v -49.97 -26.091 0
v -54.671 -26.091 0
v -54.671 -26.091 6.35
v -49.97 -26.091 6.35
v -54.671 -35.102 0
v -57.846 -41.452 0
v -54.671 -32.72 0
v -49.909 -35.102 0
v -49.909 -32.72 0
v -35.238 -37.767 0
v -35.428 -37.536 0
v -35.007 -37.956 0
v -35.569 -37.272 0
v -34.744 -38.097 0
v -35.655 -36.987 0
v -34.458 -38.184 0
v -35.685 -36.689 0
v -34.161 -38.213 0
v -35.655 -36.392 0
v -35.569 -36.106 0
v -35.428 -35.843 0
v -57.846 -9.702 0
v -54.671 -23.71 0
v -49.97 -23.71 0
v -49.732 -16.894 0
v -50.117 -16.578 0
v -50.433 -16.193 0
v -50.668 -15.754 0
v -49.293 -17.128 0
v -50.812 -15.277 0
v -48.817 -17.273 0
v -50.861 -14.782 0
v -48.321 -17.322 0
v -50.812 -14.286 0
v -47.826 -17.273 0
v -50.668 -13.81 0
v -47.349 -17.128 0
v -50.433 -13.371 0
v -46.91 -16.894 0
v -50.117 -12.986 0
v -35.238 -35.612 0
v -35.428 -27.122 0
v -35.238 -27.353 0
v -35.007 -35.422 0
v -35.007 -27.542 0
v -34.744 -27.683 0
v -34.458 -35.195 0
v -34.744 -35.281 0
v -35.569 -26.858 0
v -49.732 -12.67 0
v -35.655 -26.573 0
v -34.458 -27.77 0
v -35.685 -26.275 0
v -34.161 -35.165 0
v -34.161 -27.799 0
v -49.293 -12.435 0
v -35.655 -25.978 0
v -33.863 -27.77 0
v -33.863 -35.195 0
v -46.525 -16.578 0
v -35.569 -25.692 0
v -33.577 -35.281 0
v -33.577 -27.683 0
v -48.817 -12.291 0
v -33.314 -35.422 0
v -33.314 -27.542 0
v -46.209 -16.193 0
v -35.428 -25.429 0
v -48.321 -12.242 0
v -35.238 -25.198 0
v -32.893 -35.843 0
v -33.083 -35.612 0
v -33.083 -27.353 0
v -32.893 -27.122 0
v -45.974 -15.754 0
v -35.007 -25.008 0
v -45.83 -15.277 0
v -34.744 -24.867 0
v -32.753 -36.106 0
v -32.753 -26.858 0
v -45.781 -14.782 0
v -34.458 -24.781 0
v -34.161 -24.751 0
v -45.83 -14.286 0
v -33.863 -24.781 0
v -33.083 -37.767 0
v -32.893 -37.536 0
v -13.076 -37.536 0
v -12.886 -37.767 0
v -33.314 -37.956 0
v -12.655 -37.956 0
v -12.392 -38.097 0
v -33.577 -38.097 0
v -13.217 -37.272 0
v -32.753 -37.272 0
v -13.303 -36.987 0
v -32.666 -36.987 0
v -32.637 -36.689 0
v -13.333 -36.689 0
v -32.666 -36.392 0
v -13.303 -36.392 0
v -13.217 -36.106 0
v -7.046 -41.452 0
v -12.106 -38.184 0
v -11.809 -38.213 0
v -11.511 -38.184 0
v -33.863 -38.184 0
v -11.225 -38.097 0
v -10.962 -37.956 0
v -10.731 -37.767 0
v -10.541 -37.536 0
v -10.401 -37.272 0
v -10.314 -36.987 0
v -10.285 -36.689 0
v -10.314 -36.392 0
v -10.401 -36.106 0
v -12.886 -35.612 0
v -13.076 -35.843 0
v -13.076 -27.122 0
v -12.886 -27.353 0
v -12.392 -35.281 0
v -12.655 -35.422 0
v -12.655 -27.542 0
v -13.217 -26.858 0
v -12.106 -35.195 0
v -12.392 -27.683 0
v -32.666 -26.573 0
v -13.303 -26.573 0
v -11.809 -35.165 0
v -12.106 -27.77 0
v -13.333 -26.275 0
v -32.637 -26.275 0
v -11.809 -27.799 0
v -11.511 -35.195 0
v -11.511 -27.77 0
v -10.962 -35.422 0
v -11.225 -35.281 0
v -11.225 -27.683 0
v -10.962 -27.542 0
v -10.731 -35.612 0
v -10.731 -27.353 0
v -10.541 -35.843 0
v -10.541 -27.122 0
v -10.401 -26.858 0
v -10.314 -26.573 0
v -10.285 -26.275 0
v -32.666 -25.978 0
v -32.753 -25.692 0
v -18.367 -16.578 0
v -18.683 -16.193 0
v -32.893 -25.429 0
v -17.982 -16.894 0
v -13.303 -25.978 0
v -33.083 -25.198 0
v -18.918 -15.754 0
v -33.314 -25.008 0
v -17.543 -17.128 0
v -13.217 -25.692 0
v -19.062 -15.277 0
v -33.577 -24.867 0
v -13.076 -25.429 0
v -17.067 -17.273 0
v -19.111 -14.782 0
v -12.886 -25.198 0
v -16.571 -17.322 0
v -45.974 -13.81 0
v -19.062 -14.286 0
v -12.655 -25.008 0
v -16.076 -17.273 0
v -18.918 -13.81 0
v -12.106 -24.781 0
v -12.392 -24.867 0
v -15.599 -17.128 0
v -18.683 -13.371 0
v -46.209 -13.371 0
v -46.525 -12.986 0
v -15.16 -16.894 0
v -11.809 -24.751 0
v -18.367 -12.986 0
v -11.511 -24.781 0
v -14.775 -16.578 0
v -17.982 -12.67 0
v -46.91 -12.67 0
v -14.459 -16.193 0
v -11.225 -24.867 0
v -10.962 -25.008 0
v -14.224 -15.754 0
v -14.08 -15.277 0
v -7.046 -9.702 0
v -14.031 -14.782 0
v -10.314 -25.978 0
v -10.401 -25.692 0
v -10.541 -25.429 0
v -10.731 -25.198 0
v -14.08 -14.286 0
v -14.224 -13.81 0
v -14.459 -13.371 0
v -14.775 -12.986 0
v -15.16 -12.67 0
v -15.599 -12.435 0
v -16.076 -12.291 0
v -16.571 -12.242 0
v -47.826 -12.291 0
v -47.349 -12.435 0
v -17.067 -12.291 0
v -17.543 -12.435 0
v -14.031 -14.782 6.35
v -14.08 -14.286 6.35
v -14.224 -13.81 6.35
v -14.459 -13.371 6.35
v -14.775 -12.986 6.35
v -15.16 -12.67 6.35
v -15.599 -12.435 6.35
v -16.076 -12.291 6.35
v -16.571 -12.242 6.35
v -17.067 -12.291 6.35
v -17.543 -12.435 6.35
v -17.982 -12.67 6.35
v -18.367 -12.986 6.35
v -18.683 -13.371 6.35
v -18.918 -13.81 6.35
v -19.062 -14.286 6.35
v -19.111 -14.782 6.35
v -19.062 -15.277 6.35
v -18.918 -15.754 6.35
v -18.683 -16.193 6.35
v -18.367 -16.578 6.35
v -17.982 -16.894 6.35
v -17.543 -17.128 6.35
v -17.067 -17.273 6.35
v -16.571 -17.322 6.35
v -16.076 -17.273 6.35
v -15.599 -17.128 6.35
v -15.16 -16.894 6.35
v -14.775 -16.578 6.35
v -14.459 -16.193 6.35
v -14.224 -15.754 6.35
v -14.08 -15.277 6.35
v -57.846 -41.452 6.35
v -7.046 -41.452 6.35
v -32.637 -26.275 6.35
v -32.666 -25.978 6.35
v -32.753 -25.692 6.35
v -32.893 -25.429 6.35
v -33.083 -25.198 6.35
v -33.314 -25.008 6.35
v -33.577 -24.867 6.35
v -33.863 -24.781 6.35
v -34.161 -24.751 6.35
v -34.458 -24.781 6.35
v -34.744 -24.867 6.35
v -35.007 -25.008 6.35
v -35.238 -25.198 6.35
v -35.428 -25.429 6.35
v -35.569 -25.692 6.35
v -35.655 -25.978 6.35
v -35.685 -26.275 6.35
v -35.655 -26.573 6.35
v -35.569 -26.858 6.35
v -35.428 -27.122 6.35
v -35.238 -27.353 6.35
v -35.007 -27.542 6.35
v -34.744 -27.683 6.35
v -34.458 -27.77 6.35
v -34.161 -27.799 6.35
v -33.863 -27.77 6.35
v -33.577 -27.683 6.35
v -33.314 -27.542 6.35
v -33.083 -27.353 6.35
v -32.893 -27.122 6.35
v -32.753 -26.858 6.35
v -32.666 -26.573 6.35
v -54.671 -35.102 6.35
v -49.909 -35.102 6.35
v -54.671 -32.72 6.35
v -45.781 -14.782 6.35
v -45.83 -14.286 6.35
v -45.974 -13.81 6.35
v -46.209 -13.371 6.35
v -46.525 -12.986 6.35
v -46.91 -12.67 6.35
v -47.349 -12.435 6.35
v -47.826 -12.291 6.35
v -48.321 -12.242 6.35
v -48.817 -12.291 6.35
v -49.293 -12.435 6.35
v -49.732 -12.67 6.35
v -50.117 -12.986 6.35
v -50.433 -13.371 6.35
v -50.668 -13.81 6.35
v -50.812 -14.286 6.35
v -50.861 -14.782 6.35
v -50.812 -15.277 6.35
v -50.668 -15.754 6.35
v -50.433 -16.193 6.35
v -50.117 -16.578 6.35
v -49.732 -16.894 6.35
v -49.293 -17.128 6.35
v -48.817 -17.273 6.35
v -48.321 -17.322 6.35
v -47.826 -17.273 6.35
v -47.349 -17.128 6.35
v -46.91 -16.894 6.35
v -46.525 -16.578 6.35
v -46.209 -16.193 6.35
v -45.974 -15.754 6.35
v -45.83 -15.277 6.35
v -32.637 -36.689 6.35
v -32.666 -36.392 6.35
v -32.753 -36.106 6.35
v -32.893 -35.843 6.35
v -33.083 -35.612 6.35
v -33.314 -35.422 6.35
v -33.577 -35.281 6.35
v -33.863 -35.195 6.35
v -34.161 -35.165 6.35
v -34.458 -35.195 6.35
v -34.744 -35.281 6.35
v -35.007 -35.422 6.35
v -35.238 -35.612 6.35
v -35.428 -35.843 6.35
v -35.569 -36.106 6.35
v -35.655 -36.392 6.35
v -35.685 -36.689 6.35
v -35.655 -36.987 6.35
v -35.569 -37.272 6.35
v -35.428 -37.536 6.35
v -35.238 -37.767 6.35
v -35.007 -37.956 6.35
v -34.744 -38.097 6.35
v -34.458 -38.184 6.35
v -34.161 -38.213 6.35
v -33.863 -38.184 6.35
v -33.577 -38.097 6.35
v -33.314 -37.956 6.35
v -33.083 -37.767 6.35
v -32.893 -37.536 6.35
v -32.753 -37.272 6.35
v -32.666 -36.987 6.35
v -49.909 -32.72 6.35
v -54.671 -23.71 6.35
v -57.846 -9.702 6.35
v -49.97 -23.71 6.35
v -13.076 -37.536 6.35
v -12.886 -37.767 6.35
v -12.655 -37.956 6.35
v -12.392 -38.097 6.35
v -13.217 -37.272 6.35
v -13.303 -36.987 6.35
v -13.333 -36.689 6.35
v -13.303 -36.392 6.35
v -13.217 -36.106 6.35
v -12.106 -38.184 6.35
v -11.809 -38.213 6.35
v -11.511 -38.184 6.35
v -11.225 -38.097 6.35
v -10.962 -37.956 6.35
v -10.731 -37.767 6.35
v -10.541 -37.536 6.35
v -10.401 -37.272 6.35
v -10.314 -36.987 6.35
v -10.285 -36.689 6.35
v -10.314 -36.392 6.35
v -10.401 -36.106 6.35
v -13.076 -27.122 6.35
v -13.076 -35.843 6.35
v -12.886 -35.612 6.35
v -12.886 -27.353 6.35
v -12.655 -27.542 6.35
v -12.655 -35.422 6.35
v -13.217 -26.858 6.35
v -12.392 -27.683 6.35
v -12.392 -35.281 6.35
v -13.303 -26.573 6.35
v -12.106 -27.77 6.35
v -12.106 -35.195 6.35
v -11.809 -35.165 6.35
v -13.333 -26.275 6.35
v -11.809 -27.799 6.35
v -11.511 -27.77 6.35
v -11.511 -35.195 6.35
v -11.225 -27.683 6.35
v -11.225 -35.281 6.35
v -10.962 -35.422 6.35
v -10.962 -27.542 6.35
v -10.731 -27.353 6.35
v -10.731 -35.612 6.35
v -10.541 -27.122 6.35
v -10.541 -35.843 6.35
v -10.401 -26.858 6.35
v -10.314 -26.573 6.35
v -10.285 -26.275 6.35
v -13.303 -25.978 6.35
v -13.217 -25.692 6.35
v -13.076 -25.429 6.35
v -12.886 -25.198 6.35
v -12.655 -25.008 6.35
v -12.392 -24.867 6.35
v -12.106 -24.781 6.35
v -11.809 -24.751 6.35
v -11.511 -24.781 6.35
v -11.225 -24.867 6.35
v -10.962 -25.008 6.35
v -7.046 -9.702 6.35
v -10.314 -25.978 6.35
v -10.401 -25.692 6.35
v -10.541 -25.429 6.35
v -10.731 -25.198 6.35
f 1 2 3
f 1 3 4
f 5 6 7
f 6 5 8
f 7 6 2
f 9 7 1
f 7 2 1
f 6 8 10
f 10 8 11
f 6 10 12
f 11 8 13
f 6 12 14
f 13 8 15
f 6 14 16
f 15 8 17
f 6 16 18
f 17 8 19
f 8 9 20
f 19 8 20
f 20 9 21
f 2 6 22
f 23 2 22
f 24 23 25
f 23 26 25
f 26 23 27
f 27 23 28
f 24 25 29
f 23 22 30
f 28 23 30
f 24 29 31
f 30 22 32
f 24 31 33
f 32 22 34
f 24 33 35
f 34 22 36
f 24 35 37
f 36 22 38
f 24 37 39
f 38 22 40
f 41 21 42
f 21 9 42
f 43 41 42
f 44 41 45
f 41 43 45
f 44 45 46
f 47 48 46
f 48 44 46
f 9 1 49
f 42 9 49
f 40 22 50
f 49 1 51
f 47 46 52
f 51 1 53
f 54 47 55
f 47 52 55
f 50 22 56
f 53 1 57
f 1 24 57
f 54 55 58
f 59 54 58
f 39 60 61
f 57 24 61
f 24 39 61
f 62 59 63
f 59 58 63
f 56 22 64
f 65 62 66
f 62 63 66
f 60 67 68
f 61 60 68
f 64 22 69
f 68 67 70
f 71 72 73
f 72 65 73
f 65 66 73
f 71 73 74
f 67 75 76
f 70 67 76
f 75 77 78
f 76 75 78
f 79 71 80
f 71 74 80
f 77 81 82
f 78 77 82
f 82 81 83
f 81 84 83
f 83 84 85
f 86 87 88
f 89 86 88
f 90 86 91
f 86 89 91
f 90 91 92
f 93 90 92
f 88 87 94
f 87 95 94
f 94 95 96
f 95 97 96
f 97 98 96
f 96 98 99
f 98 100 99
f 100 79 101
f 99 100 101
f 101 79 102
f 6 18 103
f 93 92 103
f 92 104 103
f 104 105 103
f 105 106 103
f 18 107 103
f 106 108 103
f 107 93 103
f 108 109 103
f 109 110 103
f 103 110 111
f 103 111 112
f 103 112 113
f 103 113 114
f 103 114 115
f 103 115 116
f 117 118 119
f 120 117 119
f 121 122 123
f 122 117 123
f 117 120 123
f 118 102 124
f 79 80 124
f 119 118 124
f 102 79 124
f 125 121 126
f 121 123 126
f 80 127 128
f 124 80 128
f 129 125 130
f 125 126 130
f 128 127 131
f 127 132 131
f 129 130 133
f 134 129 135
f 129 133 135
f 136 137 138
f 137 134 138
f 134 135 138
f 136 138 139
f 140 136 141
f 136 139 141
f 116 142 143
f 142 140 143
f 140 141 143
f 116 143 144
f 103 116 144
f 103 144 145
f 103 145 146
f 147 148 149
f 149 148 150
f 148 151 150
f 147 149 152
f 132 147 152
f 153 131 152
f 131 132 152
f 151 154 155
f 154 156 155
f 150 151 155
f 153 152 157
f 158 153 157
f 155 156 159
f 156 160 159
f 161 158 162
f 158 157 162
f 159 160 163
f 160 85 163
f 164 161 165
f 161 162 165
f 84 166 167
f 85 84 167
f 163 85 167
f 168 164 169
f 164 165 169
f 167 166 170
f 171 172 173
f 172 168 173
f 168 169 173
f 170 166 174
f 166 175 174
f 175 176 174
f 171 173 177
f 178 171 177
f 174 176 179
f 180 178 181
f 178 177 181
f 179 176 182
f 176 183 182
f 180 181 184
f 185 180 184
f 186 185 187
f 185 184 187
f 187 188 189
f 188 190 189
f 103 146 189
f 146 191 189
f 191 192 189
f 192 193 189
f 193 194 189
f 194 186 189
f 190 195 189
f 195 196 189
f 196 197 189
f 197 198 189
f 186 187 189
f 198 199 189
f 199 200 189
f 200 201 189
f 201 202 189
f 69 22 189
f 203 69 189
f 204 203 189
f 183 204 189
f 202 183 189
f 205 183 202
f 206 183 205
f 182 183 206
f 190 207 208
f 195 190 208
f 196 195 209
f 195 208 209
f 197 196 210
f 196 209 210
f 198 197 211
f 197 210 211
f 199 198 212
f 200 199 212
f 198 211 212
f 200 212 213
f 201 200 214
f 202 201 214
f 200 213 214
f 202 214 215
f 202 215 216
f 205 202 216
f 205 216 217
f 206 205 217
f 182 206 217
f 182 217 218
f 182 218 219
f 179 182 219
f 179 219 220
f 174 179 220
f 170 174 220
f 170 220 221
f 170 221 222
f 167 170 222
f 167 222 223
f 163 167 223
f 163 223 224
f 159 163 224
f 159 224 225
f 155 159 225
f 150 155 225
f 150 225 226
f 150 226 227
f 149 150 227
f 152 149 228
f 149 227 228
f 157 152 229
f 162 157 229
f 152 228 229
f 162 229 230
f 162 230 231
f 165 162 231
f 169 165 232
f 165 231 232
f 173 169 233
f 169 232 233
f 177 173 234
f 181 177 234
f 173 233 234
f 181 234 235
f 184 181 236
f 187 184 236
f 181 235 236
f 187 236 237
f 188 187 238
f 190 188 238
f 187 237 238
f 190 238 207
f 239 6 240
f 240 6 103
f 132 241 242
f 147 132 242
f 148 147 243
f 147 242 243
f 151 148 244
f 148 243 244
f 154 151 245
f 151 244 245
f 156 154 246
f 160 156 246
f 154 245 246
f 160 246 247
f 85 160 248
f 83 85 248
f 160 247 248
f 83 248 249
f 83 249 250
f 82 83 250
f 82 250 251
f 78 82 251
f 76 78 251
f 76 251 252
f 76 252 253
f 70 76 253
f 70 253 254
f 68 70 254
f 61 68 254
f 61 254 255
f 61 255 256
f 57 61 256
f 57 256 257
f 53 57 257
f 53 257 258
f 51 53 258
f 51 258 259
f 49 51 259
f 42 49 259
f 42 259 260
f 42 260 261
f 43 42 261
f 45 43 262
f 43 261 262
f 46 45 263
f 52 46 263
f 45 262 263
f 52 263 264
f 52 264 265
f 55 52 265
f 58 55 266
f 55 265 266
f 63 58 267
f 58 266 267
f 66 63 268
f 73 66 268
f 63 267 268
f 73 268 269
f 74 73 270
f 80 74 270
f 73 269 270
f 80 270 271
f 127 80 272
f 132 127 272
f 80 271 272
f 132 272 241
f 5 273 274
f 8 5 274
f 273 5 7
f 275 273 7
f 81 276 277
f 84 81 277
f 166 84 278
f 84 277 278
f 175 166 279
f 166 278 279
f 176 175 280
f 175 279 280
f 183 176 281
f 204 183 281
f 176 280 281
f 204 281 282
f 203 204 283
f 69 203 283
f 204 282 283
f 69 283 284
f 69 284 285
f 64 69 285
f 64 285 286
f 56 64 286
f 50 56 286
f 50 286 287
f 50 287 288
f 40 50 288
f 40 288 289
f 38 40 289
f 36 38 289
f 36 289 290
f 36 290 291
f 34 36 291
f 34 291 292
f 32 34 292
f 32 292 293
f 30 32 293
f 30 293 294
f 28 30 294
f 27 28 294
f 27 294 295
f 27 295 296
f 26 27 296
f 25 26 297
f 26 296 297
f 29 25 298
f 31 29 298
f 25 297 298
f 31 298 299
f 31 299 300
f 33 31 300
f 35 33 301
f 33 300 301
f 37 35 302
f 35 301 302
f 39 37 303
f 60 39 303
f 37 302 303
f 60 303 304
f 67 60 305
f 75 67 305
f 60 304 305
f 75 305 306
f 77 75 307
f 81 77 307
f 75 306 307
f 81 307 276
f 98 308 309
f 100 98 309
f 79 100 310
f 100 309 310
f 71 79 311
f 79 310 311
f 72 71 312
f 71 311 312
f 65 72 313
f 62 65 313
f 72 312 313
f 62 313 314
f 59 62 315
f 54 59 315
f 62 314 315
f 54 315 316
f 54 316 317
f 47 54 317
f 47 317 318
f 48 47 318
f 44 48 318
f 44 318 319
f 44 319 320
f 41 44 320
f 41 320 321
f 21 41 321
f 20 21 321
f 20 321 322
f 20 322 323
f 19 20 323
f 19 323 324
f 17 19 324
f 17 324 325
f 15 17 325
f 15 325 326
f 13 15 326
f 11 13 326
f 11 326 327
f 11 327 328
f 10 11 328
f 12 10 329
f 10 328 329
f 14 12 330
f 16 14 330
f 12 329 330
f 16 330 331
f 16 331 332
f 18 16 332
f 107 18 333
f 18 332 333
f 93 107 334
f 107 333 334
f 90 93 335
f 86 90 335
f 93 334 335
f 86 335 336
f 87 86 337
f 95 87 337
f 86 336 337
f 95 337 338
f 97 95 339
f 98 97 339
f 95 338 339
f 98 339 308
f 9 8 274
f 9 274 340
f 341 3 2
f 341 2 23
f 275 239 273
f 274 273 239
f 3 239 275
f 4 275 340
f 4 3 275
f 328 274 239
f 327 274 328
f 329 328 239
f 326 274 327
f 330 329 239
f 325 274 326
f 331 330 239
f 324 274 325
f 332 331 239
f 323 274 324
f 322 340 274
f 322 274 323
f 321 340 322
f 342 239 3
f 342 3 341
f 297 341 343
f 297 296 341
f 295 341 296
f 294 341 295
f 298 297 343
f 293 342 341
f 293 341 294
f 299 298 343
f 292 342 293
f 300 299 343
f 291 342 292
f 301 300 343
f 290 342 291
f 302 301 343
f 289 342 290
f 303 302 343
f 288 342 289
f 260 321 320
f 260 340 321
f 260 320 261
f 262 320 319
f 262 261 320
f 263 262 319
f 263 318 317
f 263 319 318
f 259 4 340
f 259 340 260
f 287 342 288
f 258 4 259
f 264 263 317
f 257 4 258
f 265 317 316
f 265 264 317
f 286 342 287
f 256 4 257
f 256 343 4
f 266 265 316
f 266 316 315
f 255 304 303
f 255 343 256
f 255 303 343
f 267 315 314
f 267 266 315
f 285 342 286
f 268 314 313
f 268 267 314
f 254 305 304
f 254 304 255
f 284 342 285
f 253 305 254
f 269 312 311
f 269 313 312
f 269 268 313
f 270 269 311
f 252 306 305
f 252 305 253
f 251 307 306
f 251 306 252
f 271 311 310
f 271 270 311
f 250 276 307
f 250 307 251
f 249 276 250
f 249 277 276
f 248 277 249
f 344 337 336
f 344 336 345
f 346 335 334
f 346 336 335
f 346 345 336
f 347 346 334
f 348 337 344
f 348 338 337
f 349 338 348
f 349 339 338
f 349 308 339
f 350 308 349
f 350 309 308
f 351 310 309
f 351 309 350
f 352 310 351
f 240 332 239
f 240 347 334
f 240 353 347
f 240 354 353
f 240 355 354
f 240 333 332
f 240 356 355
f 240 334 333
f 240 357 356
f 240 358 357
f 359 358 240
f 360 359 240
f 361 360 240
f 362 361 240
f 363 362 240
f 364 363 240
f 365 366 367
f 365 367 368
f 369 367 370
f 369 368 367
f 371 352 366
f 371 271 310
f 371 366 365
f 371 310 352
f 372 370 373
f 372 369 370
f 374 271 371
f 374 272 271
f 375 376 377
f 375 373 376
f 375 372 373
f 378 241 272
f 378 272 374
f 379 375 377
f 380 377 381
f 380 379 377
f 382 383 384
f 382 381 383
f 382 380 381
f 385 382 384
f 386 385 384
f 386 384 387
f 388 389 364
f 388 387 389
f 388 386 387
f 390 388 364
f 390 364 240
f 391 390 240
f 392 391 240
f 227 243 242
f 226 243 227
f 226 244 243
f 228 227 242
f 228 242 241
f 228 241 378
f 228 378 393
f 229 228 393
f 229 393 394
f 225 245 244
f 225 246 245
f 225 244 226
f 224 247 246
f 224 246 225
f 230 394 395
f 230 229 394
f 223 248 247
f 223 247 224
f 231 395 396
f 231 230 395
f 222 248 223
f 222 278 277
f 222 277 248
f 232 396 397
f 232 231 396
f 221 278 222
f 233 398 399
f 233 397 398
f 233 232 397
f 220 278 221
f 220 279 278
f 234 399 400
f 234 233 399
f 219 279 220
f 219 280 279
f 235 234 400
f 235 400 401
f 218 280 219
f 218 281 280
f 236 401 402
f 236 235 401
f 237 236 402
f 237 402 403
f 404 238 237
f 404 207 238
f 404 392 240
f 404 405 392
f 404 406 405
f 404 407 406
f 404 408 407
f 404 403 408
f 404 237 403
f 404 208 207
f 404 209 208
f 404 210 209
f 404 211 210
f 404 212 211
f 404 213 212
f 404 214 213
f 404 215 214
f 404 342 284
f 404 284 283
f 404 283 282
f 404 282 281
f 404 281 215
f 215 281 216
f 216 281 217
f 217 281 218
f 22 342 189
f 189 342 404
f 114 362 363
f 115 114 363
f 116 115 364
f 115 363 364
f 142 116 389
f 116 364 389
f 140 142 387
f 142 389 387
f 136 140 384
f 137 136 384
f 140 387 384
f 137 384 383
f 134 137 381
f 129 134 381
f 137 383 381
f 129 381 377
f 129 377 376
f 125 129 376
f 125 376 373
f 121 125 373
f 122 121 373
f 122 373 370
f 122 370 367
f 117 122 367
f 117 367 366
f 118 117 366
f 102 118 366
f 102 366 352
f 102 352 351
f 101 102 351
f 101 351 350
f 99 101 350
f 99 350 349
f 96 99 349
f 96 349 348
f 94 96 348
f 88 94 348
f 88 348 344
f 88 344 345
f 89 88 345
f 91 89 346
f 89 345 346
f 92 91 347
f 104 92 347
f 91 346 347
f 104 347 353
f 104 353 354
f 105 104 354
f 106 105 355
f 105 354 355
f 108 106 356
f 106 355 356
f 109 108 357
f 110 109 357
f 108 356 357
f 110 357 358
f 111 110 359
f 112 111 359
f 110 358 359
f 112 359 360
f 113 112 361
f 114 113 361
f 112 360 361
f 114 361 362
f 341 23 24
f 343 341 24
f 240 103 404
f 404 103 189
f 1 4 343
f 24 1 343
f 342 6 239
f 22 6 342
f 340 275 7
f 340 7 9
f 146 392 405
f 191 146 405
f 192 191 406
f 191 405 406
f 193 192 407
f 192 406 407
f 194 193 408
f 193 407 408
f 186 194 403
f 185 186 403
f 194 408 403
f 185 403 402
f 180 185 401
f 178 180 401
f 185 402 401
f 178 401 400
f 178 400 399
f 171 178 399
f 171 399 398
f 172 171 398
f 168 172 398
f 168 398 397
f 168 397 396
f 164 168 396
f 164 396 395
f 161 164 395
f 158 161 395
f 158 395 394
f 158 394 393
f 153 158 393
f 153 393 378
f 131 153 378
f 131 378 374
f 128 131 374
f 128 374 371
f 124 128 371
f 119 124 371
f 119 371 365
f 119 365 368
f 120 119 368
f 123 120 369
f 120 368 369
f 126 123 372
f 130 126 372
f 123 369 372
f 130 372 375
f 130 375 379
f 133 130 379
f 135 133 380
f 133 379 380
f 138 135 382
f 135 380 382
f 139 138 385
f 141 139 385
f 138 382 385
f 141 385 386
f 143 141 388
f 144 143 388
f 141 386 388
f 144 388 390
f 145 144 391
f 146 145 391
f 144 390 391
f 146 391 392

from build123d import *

# Parameters (mm, degrees)
SKETCH1_W           = 50.8
SKETCH1_H           = 57.15
BOSS_EXTRUDE1_DEPTH = 6.35
SKETCH5_R           = 1.524
SKETCH5_R_2         = 2.54
CUT_EXTRUDE1_DEPTH  = 72.447438113
SKETCH6_W           = 4.7625
SKETCH6_H           = 2.38125
SKETCH6_W_2         = 4.700923451
CUT_EXTRUDE2_DEPTH  = 72.447438113
SKETCH7_W           = 50.8
SKETCH7_H           = 25.4
CUT_EXTRUDE3_DEPTH  = 72.447438113


with BuildPart() as part:
    # Sketch1 → Boss-Extrude1 (new body)
    with BuildSketch(Plane.XY):
        with Locations((-32.446072824, -12.876728212)):
            Rectangle(SKETCH1_W, SKETCH1_H)
    extrude(amount=BOSS_EXTRUDE1_DEPTH)

    # Sketch5 → Cut-Extrude1 (cut, through all)
    with BuildSketch(Plane.XY.offset(6.35)):
        with Locations((-11.808572824, -26.275228212)):
            Circle(SKETCH5_R)
        with Locations((-11.808572824, -36.689228212)):
            Circle(SKETCH5_R)
        with Locations((-34.160572824, -26.275228212)):
            Circle(SKETCH5_R)
        with Locations((-34.160572824, -36.689228212)):
            Circle(SKETCH5_R)
        with Locations((-48.321072824, 10.618271788)):
            Circle(SKETCH5_R_2)
        with Locations((-16.571072824, 10.618271788)):
            Circle(SKETCH5_R_2)
        with Locations((-48.321072824, -2.081728212)):
            Circle(SKETCH5_R_2)
        with Locations((-16.571072824, -2.081728212)):
            Circle(SKETCH5_R_2)
        with Locations((-48.321072824, -14.781728212)):
            Circle(SKETCH5_R_2)
        with Locations((-16.571072824, -14.781728212)):
            Circle(SKETCH5_R_2)
    extrude(amount=-CUT_EXTRUDE1_DEPTH, mode=Mode.SUBTRACT)

    # Sketch6 → Cut-Extrude2 (cut, through all)
    with BuildSketch(Plane.XY.offset(6.35)):
        with Locations((-52.289822824, -33.911103212)):
            Rectangle(SKETCH6_W, SKETCH6_H)
        with Locations((-52.320611099, -24.900183987)):
            Rectangle(SKETCH6_W_2, SKETCH6_H)
    extrude(amount=-CUT_EXTRUDE2_DEPTH, mode=Mode.SUBTRACT)

    # Sketch7 → Cut-Extrude3 (cut, through all)
    with BuildSketch(Plane.XY.offset(6.35)):
        with Locations((-32.446072824, 2.998271788)):
            Rectangle(SKETCH7_W, SKETCH7_H)
    extrude(amount=-CUT_EXTRUDE3_DEPTH, mode=Mode.SUBTRACT)


solid = part.part
